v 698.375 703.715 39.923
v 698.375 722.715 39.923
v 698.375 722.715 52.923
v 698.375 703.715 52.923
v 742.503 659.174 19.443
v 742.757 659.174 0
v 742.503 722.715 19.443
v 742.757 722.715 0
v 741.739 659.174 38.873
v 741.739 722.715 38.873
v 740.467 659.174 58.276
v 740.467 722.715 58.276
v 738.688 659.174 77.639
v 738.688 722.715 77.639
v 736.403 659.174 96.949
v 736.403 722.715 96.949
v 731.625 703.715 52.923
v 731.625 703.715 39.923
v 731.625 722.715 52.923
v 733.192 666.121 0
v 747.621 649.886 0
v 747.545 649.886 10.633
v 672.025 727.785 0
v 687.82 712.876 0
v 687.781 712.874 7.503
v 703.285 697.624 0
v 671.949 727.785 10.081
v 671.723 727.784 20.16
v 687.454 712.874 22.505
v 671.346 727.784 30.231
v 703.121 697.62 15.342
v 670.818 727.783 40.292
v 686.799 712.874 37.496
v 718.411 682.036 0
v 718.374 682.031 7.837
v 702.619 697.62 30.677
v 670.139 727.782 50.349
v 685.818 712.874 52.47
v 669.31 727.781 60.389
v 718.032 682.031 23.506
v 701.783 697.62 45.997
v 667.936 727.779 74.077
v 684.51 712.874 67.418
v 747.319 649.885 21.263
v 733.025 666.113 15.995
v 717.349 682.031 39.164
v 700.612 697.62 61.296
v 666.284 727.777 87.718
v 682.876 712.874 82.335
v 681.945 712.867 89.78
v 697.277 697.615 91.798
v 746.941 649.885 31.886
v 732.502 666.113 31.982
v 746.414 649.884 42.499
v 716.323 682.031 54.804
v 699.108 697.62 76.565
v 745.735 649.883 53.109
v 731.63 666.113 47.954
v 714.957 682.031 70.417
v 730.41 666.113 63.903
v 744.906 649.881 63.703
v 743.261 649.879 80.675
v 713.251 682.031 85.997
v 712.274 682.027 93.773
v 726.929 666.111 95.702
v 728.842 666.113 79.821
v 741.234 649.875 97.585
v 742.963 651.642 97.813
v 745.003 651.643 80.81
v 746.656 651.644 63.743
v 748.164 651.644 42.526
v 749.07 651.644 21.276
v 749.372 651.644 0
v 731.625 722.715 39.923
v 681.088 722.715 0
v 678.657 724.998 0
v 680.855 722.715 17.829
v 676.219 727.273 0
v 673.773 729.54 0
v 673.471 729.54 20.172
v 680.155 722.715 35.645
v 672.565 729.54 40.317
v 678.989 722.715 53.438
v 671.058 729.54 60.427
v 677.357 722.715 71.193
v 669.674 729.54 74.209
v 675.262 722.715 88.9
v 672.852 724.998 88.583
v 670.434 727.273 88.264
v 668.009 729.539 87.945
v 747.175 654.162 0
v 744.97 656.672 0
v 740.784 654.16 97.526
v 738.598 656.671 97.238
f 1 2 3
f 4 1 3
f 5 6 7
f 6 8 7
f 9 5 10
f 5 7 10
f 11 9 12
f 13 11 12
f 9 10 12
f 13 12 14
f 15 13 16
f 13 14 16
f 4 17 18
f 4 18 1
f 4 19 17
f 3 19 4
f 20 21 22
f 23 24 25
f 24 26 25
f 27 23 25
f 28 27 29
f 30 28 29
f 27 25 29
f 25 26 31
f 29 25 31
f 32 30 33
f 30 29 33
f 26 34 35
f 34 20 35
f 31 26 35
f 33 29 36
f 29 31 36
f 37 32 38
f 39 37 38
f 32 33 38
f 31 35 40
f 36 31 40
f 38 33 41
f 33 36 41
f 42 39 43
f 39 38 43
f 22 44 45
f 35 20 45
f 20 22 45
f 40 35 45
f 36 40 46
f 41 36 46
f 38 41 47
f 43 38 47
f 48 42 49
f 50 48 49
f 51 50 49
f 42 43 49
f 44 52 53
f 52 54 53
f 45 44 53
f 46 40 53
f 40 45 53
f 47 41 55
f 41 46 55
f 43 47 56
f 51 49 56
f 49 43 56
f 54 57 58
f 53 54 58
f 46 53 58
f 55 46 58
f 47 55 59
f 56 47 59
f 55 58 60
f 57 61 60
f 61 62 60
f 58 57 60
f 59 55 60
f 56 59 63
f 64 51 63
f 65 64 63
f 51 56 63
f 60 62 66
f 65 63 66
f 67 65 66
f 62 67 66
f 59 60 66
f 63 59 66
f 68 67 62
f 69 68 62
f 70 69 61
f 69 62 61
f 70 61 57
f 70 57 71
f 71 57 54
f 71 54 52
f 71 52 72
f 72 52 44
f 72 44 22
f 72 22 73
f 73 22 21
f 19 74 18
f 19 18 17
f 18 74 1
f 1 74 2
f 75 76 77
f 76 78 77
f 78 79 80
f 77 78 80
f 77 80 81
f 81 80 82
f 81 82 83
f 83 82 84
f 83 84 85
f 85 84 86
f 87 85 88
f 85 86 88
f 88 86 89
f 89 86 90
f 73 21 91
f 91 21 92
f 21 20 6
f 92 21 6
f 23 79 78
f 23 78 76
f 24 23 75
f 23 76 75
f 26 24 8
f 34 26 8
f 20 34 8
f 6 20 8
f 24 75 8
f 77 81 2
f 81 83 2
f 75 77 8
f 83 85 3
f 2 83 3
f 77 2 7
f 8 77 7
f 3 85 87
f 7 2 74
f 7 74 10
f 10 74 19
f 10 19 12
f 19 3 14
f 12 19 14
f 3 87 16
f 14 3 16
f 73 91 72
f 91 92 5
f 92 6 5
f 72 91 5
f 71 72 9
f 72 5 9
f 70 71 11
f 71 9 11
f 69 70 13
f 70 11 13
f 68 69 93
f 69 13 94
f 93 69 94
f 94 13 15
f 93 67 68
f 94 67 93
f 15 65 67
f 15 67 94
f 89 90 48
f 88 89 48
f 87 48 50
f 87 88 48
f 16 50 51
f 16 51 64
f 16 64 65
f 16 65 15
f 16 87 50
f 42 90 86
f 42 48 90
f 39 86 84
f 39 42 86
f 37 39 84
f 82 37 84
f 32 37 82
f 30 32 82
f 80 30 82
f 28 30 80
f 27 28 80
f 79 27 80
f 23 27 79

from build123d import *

# Parameters (mm, degrees)
REVOLVE2_ANGLE           = 7.5
SKETCH4_W                = 33.25
SKETCH4_H                = 13
CUT_EXTRUDE5_DEPTH       = 19
SKETCH7_W                = 33.25
SKETCH7_H                = 13
CUT_EXTRUDE7_DEPTH       = 19
CUT_EXTRUDE8_DEPTH       = 1799.499288206
CUT_EXTRUDE8_DEPTH_BACK  = 1799.499288206
SKETCH9_W                = 188.635889627
SKETCH9_H                = 632.041441351
CUT_EXTRUDE9_DEPTH       = 1799.499288206
CUT_EXTRUDE9_DEPTH_BACK  = 1799.499288206
SKETCH10_W               = 436.927860133
SKETCH10_H               = 1601.4752783
CUT_EXTRUDE10_DEPTH      = 143.403889156
CUT_EXTRUDE10_DEPTH_BACK = 143.403889156


with BuildPart() as part:
    # Sketch2 → Revolve2 (revolve)
    with BuildSketch(Plane.XY):
        with BuildLine():
            Line((0, 993.075249624), (0, 990.6))
            ThreePointArc((0, 990.6), (990.6, 0), (0, -990.6))
            Line((0, -990.6), (0, -993.075249624))
            ThreePointArc((0, -993.075249624), (357.30221933, -926.570869107), (666.748724276, -735.965073963))
            Line((666.748724276, -735.965073963), (742.973100692, -735.965073963))
            Line((742.973100692, -735.965073963), (742.973100692, -658.930514596))
            ThreePointArc((742.973100692, -658.930514596), (993.075236283, 0.162783709), (742.757038562, 659.174053709))
            Line((742.757038562, 659.174053709), (742.757038562, 722.715073963))
            Line((742.757038562, 722.715073963), (681.088374063, 722.715073963))
            ThreePointArc((681.088374063, 722.715073963), (366.393230651, 923.013787519), (0, 993.075249624))
        make_face()
    revolve(axis=Axis((0, 993.075249624, 0), (0, -1, 0)), revolution_arc=REVOLVE2_ANGLE)

    # Sketch4 → Cut-Extrude5 (cut)
    with BuildSketch(Plane.XZ.offset(735.965073963)):
        with Locations((705.258501449, 49.061390401)):
            Rectangle(SKETCH4_W, SKETCH4_H)
    extrude(amount=-CUT_EXTRUDE5_DEPTH, mode=Mode.SUBTRACT)

    # Sketch7 → Cut-Extrude7 (cut)
    with BuildSketch(Plane(origin=(0, 722.715073963, 0), x_dir=(-1, 0, 0), z_dir=(0, 1, 0))):
        with Locations((-714.999743141, 46.422731407)):
            Rectangle(SKETCH7_W, SKETCH7_H)
    extrude(amount=-CUT_EXTRUDE7_DEPTH, mode=Mode.SUBTRACT)

    # Sketch9 → Cut-Extrude8 (cut, two sides: drawn at the far end of the back side and taken through both)
    with BuildSketch(Plane(origin=(770.075395243, 627.042532096, 0), x_dir=(0, 0, -1), z_dir=(0.775445159402277, 0.6314149228198344, 0)).offset(-CUT_EXTRUDE8_DEPTH_BACK)):
        with Locations((-24.021749008, 516.225121034)):
            Rectangle(SKETCH9_W, SKETCH9_H)
    extrude(amount=CUT_EXTRUDE8_DEPTH + CUT_EXTRUDE8_DEPTH_BACK, mode=Mode.SUBTRACT)

    # Sketch10 → Cut-Extrude9 (cut, two sides: drawn at the far end of the back side and taken through both)
    with BuildSketch(Plane(origin=(770.075395243, 627.042532096, 0), x_dir=(0, 0, -1), z_dir=(0.775445159402277, 0.6314149228198344, 0)).offset(-CUT_EXTRUDE9_DEPTH_BACK)):
        with Locations((4.82975611, -781.418075933)):
            Rectangle(SKETCH10_W, SKETCH10_H)
    extrude(amount=CUT_EXTRUDE9_DEPTH + CUT_EXTRUDE9_DEPTH_BACK, mode=Mode.SUBTRACT)

    # Sketch12 → Cut-Extrude10 (cut, two sides: drawn at the far end of the back side and taken through both)
    with BuildSketch(Plane(origin=(700.633749088, 703.783206005, 0), x_dir=(0.7086907122814721, -0.7055192940848463, 0), z_dir=(0.7055192940848463, 0.7086907122814721, 0)).offset(-CUT_EXTRUDE10_DEPTH_BACK)):
        with BuildLine():
            Line((-41.294583605, -87.970897636), (-47.210429628, -112.285313767))
            Line((-47.210429628, -112.285313767), (-119.119874742, -100.128105701))
            Line((-119.119874742, -100.128105701), (-110.576768671, 17.662490687))
            Line((-110.576768671, 17.662490687), (-37.208423865, 15.148795667))
            Line((-37.208423865, 15.148795667), (-37.208423865, 0))
            add(Edge.make_bspline(
                [(-41.294583605, -87.970897636), (-39.934567915, -73.394235927), (-38.912646446, -58.753764388), (-37.549574236, -29.408857228), (-37.208423865, -14.704430952), (-37.208423865, 0)],
                knots=[0, 0, 0, 0, 0.5, 0.5, 1, 1, 1, 1], degree=3))
        make_face()
        with BuildLine():
            add(Edge.make_bspline(
                [(66.778461717, -97.878222384), (68.291902553, -81.657148428), (69.428925425, -65.367159938), (70.945475233, -32.718109498), (71.325001659, -16.35905716), (71.325001659, 0)],
                knots=[0, 0, 0, 0, 0.5, 0.5, 1, 1, 1, 1], degree=3))
            Line((71.325001659, 0), (71.325001659, 10.254449573))
            Line((71.325001659, 10.254449573), (98.450701035, 7.723597346))
            Line((98.450701035, 7.723597346), (86.999767635, -115.007620888))
            Line((86.999767635, -115.007620888), (65.180273381, -115.007620888))
            Line((65.180273381, -115.007620888), (66.778461717, -97.878222384))
        make_face()
    extrude(amount=CUT_EXTRUDE10_DEPTH + CUT_EXTRUDE10_DEPTH_BACK, mode=Mode.SUBTRACT)


solid = part.part
